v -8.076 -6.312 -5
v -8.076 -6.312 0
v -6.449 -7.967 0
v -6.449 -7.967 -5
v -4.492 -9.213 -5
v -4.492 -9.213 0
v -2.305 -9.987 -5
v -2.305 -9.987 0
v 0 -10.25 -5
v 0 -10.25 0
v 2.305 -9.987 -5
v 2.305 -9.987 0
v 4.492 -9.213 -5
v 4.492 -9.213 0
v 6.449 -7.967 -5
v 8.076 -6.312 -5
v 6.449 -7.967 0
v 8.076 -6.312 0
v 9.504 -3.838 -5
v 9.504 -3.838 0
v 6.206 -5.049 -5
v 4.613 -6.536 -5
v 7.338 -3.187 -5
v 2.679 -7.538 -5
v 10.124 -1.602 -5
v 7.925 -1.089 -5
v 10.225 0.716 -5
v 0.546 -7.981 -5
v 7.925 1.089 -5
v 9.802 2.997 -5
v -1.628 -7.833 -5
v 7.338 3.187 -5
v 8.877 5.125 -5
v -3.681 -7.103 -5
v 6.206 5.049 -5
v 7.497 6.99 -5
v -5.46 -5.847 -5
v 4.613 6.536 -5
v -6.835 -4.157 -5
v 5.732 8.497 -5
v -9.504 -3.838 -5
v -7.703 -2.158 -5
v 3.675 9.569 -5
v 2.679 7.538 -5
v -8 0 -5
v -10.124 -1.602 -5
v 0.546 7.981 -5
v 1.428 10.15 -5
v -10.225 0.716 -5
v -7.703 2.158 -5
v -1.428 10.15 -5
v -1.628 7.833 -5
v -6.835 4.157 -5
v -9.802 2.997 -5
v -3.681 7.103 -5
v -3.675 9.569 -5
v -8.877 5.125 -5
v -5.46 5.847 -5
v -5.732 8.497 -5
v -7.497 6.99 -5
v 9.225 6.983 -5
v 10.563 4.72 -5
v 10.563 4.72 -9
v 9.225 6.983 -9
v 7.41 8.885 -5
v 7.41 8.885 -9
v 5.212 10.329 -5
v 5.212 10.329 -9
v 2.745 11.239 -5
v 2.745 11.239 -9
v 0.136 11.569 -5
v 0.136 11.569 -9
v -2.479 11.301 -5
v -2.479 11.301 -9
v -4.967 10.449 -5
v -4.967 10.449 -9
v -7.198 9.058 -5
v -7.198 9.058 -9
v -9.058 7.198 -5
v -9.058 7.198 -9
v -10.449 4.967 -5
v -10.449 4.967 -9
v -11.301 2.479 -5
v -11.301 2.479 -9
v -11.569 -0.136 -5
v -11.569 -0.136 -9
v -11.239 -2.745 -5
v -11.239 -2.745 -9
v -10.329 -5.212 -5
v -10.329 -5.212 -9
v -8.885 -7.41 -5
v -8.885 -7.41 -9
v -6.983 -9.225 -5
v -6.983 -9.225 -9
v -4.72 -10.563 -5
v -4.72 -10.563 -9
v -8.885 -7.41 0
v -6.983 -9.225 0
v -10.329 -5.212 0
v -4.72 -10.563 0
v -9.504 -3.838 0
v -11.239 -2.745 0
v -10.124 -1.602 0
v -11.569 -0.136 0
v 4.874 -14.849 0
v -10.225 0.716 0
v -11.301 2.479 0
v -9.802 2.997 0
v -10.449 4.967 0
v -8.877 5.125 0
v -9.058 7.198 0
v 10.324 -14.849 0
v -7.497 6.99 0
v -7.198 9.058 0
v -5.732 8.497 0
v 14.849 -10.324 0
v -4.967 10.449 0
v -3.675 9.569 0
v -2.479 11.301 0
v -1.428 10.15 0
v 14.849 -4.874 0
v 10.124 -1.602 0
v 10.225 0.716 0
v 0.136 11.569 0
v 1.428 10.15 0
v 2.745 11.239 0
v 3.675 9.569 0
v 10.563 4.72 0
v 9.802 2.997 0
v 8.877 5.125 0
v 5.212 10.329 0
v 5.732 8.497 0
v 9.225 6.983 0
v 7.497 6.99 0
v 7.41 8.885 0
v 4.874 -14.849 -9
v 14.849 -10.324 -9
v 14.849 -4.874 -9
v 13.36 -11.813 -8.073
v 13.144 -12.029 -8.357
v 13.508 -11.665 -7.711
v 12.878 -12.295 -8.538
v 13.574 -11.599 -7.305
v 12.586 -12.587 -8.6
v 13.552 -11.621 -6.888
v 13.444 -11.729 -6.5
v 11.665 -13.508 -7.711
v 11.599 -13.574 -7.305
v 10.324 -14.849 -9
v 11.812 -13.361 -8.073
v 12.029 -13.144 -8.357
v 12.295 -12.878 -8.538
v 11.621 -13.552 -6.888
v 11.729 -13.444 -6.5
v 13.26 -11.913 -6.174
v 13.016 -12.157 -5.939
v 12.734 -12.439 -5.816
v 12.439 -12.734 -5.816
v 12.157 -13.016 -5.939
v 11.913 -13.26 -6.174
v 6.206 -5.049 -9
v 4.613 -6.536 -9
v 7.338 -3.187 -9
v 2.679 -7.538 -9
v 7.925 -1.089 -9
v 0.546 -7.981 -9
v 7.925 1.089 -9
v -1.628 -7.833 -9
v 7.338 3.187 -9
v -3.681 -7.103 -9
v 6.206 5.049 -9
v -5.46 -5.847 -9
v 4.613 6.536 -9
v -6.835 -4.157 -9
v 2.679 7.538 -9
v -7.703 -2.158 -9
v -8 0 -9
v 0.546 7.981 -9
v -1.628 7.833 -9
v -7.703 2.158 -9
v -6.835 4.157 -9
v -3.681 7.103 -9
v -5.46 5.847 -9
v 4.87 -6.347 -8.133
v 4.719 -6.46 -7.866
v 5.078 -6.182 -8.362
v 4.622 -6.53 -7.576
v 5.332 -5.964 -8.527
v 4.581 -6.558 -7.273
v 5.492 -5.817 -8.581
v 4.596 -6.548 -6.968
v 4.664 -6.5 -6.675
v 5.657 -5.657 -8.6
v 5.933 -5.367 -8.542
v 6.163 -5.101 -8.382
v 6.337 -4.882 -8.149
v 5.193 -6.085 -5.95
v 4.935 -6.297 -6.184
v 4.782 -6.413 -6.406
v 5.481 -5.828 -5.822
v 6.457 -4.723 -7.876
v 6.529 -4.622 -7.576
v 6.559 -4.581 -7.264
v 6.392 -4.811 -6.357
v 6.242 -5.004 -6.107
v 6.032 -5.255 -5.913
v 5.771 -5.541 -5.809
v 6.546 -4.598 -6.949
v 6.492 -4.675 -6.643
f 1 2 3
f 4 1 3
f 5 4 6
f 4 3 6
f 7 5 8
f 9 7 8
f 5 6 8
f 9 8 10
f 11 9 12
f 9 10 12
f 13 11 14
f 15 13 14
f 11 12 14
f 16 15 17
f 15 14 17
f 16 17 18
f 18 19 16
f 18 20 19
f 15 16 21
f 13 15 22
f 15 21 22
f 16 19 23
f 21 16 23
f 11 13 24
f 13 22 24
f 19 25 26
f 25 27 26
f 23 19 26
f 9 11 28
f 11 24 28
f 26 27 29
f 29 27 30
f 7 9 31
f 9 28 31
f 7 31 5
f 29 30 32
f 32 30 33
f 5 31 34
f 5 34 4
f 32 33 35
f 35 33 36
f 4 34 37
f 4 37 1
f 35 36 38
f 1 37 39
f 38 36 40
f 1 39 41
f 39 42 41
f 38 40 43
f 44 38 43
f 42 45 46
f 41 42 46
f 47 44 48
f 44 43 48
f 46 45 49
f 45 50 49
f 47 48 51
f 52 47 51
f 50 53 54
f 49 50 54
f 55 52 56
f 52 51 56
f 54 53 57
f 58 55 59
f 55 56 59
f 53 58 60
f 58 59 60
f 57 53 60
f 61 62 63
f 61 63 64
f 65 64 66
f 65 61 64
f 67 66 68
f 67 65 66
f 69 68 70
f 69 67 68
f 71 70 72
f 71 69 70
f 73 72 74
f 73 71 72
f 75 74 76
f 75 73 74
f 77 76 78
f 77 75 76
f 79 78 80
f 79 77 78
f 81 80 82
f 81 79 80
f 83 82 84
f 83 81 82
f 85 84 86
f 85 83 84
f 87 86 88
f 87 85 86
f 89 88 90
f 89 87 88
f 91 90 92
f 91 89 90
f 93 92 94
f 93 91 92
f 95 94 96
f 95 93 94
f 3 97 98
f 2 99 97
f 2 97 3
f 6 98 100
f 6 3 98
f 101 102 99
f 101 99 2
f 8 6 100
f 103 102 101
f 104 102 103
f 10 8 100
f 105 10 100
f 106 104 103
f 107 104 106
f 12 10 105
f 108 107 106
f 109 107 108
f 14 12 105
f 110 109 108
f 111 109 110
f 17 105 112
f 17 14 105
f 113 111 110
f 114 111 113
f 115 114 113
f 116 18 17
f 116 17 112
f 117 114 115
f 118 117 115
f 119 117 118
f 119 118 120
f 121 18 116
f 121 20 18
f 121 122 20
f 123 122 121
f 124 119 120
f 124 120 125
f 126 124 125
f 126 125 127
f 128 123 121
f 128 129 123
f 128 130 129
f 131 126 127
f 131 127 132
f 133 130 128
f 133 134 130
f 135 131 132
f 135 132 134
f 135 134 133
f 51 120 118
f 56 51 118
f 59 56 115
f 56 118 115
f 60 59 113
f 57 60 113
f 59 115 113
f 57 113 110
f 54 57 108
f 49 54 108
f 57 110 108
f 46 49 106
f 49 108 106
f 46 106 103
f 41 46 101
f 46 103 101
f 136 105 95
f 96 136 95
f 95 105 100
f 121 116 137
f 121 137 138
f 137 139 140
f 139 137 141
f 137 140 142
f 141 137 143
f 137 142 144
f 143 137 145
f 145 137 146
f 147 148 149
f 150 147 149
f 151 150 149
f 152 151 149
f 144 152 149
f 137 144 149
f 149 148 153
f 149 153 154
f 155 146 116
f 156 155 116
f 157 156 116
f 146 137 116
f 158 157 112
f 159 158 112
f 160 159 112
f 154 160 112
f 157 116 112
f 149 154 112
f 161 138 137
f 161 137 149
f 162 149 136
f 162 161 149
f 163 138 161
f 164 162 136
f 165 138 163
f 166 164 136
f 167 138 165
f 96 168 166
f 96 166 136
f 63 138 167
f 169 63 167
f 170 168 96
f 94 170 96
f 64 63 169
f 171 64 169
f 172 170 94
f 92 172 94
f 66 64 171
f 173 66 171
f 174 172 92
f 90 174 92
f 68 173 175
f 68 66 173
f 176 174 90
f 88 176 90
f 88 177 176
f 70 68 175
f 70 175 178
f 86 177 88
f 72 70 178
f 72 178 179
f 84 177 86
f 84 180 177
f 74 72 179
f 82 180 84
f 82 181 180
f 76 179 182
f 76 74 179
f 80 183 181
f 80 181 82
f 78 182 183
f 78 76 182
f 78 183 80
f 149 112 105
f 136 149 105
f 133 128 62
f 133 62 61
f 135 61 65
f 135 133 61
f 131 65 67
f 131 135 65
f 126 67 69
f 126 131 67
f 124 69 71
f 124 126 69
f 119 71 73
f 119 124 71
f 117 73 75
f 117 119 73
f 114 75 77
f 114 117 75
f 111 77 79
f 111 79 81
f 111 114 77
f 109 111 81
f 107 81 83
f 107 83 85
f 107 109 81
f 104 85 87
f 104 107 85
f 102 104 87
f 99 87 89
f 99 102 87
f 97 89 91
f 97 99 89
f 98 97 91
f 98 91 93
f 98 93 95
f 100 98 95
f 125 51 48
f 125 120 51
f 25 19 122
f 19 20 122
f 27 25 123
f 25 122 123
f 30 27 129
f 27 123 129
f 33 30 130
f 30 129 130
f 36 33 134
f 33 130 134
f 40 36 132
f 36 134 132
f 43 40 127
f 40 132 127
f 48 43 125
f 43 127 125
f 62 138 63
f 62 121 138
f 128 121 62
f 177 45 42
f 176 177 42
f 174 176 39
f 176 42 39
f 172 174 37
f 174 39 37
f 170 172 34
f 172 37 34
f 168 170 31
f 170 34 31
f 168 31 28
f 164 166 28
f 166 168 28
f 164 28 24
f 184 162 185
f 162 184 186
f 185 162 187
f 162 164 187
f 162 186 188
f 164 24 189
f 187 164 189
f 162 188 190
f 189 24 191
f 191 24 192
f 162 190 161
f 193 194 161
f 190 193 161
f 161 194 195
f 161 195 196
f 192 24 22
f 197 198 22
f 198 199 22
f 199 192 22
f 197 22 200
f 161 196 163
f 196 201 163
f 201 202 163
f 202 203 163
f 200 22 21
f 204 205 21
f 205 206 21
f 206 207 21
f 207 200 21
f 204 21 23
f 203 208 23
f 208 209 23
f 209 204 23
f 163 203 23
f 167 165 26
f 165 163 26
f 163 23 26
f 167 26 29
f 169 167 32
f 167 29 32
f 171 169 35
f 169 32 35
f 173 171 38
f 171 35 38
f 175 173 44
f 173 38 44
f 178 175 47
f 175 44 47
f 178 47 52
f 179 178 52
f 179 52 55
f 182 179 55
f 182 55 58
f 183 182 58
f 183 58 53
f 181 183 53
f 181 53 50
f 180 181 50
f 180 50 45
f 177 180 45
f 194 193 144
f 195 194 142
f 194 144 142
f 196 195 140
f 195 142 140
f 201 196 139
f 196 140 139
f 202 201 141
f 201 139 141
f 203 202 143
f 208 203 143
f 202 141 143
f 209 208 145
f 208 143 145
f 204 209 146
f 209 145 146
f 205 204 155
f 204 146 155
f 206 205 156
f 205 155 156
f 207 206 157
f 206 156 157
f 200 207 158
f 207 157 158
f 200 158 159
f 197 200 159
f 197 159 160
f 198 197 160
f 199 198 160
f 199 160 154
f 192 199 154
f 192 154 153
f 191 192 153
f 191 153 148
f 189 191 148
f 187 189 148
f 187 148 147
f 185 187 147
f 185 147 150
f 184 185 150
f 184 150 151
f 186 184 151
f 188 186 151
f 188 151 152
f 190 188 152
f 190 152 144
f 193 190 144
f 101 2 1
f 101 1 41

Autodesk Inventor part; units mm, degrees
ref_plane "YZ Plane" through (0, 0, 0) normal (1, 0, 0) x (0, 1, 0)
ref_plane "XZ Plane" through (0, 0, 0) normal (0, 1, 0) x (-1, 0, 0)
ref_plane "XY Plane" through (0, 0, 0) normal (0, 0, 1) x (1, 0, 0)
sketch "Sketch1" plane through (0, 0, 0) normal (0, 0, 1) x (1, 0, 0)
  line L0 (9.6801, -14.008) -> (7.2052, -11.5331) construction
  line L1 (7.2052, -11.5331) -> (11.5893, -7.1491) construction
  line L2 (11.5893, -7.1491) -> (14.0642, -9.6239) construction
  line L3 (14.0642, -9.6239) -> (9.6801, -14.008) construction
  arc A0 (12.6369, -4.7496) -> (4.7496, -12.6369) centre (0, 0) ccw construction
  line L4 (10.9298, -3.0424) -> (12.6369, -4.7496) construction
  line L5 (11.6618, -4.6122) -> (10.9298, -3.0424) construction
  arc A1 (11.6618, -4.6122) -> (10.8551, -4.47) centre (11.2086, -4.8235) ccw construction
  line L6 (10.7915, -4.5335) -> (10.8551, -4.47) construction
  arc A2 (10.7915, -4.5335) -> (10.6527, -4.9738) centre (11.1451, -4.887) ccw construction
  line L7 (10.915, -6.4612) -> (10.6527, -4.9738) construction
  arc A3 (10.7761, -6.9016) -> (10.915, -6.4612) centre (10.4226, -6.548) ccw construction
  line L8 (6.9016, -10.7761) -> (10.7761, -6.9016) construction
  arc A4 (6.4612, -10.915) -> (6.9016, -10.7761) centre (6.548, -10.4226) ccw construction
  line L9 (6.4612, -10.915) -> (4.9738, -10.6527) construction
  arc A5 (4.9738, -10.6527) -> (4.5335, -10.7915) centre (4.887, -11.1451) ccw construction
  line L10 (4.5335, -10.7915) -> (4.47, -10.8551) construction
  arc A6 (4.47, -10.8551) -> (4.6122, -11.6618) centre (4.8235, -11.2086) ccw construction
  line L11 (4.6122, -11.6618) -> (3.0424, -10.9298) construction
  line L12 (3.0424, -10.9298) -> (4.7496, -12.6369) construction
  line L13 (-1.7167, -14.6498) -> (-1.7167, -17.5) construction
  line L14 (-1.7167, -17.5) -> (1.7167, -17.5) construction
  line L15 (1.7167, -14.6498) -> (1.7167, -17.5) construction
  arc A7 (1.7167, -14.6498) -> (6.9595, -13.0049) centre (0, 0) ccw construction
  arc A8 (6.9595, -13.0049) -> (8.2728, -15.1789) centre (8.2994, -13.6792) ccw construction
  line L16 (8.2728, -15.1789) -> (7.6816, -15.1684) construction
  arc A9 (8.5249, -17.8901) -> (7.6816, -15.1684) centre (7.655, -16.6682) ccw construction
  line L17 (8.5249, -17.8901) -> (13.5161, -14.3366) construction
  line L18 (13.5161, -14.3366) -> (13.5161, -12.2823) construction
  line L19 (13.5161, -12.2823) -> (14.6168, -12.2823) construction
  line L20 (14.6168, -12.2823) -> (14.6168, -1.9776) construction
  arc A10 (14.6168, -1.9776) -> (1.7167, 14.6498) centre (0, 0) ccw construction
  line L21 (1.7167, 14.6498) -> (1.7167, 17.5) construction
  line L22 (-1.7167, 17.5) -> (1.7167, 17.5) construction
  line L23 (-1.7167, 14.6498) -> (-1.7167, 17.5) construction
  arc A11 (-1.7167, 14.6498) -> (-14.2817, -3.6872) centre (0, 0) ccw construction
  line L24 (-14.2817, -3.6872) -> (-15.4135, -5.7935) construction
  arc A12 (-15.4135, -5.7935) -> (-14.5984, -8.502) centre (-13.6517, -6.7402) ccw construction
  line L25 (-14.5984, -8.502) -> (-9.6326, -11.1703) construction
  arc A13 (-9.6326, -11.1703) -> (-1.7167, -14.6498) centre (0, 0) ccw construction
  line L26 (-24.6, 24.6) -> (25.2, -25.2) construction
  line L27 (25.2, 24.6) -> (-24.6, -25.2) construction
  arc A14 (-1.4283, 10.15) -> (-9.5043, -3.8381) centre (0, 0) ccw
  circle A15 centre (0, 0) radius 10.1 construction
  line L28 (-1.4283, 10.15) -> (1.4283, 10.15)
  line L29 (-8.076, -6.3119) -> (-9.5043, -3.8381)
  line L30 (9.5043, -3.8381) -> (8.076, -6.3119)
  arc A16 (1.4283, 10.15) -> (-1.4283, 10.15) centre (0, 0) ccw
  arc A17 (9.5043, -3.8381) -> (1.4283, 10.15) centre (0, 0) ccw
  arc A18 (8.076, -6.3119) -> (9.5043, -3.8381) centre (0, 0) ccw
  arc A19 (-8.076, -6.3119) -> (8.076, -6.3119) centre (0, 0) ccw
  arc A20 (-9.5043, -3.8381) -> (-8.076, -6.3119) centre (0, 0) ccw
  arc A21 (10.7054, -6.8309) -> (10.8165, -6.4786) centre (10.4226, -6.548) ccw
  line L31 (10.8165, -6.4786) -> (10.5542, -4.9912)
  arc A22 (10.7208, -4.4628) -> (10.5956, -4.6461) centre (11.1451, -4.887) ccw construction
  line L32 (10.7208, -4.4628) -> (10.7844, -4.3992) construction
  arc A23 (11.7601, -5.0598) -> (10.7844, -4.3992) centre (11.2086, -4.8235) ccw construction
  line L33 (11.7601, -5.0598) -> (10.5994, -2.5707) construction
  line L34 (10.5994, -2.5707) -> (12.5972, -4.5684) construction
  arc A24 (12.5972, -4.5684) -> (4.5684, -12.5972) centre (0, 0) ccw construction
  line L35 (4.5684, -12.5972) -> (2.5707, -10.5994) construction
  line L36 (2.5707, -10.5994) -> (4.2491, -11.3821) construction
  arc A25 (4.3992, -10.7844) -> (4.2491, -11.3821) centre (4.8235, -11.2086) ccw construction
  line L37 (4.3992, -10.7844) -> (4.4628, -10.7208) construction
  arc A26 (4.9912, -10.5542) -> (4.6461, -10.5956) centre (4.887, -11.1451) ccw
  line L38 (4.9912, -10.5542) -> (6.4786, -10.8165)
  arc A27 (6.4786, -10.8165) -> (6.8309, -10.7054) centre (6.548, -10.4226) ccw
  line L39 (6.8309, -10.7054) -> (10.7054, -6.8309)
  circle A28 centre (0, 0) radius 11.5695
  arc A29 (4.6461, -10.5956) -> (4.4628, -10.7208) centre (4.887, -11.1451) ccw construction
  arc A30 (10.5956, -4.6461) -> (10.5542, -4.9912) centre (11.1451, -4.887) ccw
  line L40 (14.8492, -10.3238) -> (10.3238, -14.8492)
  line L41 (14.8492, -10.3238) -> (14.8492, -4.8738)
  line L42 (14.8492, -4.8738) -> (10.5631, 4.7195)
  line L43 (10.3238, -14.8492) -> (4.8738, -14.8492)
  line L44 (4.8738, -14.8492) -> (-4.7195, -10.5631)
  dimension "d4" = 20.2
  dimension "d5" = 10.15
  dimension "d6" = 20.5
  dimension "d9" = 360
  dimension "d11" = 0.1
  dimension "d31" = 6.4
  dimension "d32" = 17.8
  dimension "d33" = 3.2
  dimension "d34" = 135
  dimension "d35" = 5.45
  dimension "d36" = 5.45
extrude "Extrusion1" add sketch "Sketch1" against normal blind 5 contours A16 L28 | L29 A20 | A18 L30 | L39 A27 L38 A26 A28 A30 L31 A21 | A21 L31 A30 A28 L42 L41 L40 L43 L44 A26 L38 A27 L39 | A28
sketch "Sketch3" plane through (0, 0, -5) normal (0, 0, -1) x (-1, 0, 0)
  line L0 (9.5043, -3.8381) -> (8.076, -6.3119) projected
  arc A0 (-8.076, -6.3119) -> (8.076, -6.3119) centre (0, 0) ccw projected
  line L1 (-8.076, -6.3119) -> (-9.5043, -3.8381) projected
  arc A1 (-1.4283, 10.15) -> (-9.5043, -3.8381) centre (0, 0) ccw projected
  line L2 (-1.4283, 10.15) -> (1.4283, 10.15) projected
  arc A2 (9.5043, -3.8381) -> (1.4283, 10.15) centre (0, 0) ccw projected
  arc A3 (4.7195, -10.5631) -> (-10.5631, 4.7195) centre (0, 0) ccw projected
  circle A4 centre (0, 0) radius 8
  circle A5 centre (0, 0) radius 10.25
  line L3 (-10.5631, 4.7195) -> (-14.8492, -4.8738) projected
  line L4 (-14.8492, -4.8738) -> (-14.8492, -10.3238) projected
  line L5 (-14.8492, -10.3238) -> (-10.3238, -14.8492) projected
  line L6 (-10.3238, -14.8492) -> (-4.8738, -14.8492) projected
  line L7 (-4.8738, -14.8492) -> (4.7195, -10.5631) projected
  dimension "d17" = 16
extrude "Extrusion3" add sketch "Sketch3" along normal blind 4 contours A5 L0 | L0 A0 L1 A1 L2 A2 | A5 L1 | L2 A5 | L7 L6 L5 L4 L3 A3
sketch "Sketch4" plane through (10.6492, -14.5238, 0) normal (0.7071, -0.7071, 0) x (0, 0, -1)
  line L0 (0, 0) -> (0, 5.4794) construction
  line L1 (0, 0) -> (9, 0) construction
  line L2 (0, 5.4794) -> (9, 5.4794) construction
  line L3 (0, 2.7397) -> (9, 2.7397) construction
  circle A0 centre (7.2, 2.7397) radius 1.4
  line L4 (9, 5.4794) -> (9, 0) projected
  dimension "d20" = 2.8
extrude "Extrusion4" cut sketch "Sketch4" against normal up to surface
properties part number "30_focus_inlet_objective_mount_deltastage_v7"
